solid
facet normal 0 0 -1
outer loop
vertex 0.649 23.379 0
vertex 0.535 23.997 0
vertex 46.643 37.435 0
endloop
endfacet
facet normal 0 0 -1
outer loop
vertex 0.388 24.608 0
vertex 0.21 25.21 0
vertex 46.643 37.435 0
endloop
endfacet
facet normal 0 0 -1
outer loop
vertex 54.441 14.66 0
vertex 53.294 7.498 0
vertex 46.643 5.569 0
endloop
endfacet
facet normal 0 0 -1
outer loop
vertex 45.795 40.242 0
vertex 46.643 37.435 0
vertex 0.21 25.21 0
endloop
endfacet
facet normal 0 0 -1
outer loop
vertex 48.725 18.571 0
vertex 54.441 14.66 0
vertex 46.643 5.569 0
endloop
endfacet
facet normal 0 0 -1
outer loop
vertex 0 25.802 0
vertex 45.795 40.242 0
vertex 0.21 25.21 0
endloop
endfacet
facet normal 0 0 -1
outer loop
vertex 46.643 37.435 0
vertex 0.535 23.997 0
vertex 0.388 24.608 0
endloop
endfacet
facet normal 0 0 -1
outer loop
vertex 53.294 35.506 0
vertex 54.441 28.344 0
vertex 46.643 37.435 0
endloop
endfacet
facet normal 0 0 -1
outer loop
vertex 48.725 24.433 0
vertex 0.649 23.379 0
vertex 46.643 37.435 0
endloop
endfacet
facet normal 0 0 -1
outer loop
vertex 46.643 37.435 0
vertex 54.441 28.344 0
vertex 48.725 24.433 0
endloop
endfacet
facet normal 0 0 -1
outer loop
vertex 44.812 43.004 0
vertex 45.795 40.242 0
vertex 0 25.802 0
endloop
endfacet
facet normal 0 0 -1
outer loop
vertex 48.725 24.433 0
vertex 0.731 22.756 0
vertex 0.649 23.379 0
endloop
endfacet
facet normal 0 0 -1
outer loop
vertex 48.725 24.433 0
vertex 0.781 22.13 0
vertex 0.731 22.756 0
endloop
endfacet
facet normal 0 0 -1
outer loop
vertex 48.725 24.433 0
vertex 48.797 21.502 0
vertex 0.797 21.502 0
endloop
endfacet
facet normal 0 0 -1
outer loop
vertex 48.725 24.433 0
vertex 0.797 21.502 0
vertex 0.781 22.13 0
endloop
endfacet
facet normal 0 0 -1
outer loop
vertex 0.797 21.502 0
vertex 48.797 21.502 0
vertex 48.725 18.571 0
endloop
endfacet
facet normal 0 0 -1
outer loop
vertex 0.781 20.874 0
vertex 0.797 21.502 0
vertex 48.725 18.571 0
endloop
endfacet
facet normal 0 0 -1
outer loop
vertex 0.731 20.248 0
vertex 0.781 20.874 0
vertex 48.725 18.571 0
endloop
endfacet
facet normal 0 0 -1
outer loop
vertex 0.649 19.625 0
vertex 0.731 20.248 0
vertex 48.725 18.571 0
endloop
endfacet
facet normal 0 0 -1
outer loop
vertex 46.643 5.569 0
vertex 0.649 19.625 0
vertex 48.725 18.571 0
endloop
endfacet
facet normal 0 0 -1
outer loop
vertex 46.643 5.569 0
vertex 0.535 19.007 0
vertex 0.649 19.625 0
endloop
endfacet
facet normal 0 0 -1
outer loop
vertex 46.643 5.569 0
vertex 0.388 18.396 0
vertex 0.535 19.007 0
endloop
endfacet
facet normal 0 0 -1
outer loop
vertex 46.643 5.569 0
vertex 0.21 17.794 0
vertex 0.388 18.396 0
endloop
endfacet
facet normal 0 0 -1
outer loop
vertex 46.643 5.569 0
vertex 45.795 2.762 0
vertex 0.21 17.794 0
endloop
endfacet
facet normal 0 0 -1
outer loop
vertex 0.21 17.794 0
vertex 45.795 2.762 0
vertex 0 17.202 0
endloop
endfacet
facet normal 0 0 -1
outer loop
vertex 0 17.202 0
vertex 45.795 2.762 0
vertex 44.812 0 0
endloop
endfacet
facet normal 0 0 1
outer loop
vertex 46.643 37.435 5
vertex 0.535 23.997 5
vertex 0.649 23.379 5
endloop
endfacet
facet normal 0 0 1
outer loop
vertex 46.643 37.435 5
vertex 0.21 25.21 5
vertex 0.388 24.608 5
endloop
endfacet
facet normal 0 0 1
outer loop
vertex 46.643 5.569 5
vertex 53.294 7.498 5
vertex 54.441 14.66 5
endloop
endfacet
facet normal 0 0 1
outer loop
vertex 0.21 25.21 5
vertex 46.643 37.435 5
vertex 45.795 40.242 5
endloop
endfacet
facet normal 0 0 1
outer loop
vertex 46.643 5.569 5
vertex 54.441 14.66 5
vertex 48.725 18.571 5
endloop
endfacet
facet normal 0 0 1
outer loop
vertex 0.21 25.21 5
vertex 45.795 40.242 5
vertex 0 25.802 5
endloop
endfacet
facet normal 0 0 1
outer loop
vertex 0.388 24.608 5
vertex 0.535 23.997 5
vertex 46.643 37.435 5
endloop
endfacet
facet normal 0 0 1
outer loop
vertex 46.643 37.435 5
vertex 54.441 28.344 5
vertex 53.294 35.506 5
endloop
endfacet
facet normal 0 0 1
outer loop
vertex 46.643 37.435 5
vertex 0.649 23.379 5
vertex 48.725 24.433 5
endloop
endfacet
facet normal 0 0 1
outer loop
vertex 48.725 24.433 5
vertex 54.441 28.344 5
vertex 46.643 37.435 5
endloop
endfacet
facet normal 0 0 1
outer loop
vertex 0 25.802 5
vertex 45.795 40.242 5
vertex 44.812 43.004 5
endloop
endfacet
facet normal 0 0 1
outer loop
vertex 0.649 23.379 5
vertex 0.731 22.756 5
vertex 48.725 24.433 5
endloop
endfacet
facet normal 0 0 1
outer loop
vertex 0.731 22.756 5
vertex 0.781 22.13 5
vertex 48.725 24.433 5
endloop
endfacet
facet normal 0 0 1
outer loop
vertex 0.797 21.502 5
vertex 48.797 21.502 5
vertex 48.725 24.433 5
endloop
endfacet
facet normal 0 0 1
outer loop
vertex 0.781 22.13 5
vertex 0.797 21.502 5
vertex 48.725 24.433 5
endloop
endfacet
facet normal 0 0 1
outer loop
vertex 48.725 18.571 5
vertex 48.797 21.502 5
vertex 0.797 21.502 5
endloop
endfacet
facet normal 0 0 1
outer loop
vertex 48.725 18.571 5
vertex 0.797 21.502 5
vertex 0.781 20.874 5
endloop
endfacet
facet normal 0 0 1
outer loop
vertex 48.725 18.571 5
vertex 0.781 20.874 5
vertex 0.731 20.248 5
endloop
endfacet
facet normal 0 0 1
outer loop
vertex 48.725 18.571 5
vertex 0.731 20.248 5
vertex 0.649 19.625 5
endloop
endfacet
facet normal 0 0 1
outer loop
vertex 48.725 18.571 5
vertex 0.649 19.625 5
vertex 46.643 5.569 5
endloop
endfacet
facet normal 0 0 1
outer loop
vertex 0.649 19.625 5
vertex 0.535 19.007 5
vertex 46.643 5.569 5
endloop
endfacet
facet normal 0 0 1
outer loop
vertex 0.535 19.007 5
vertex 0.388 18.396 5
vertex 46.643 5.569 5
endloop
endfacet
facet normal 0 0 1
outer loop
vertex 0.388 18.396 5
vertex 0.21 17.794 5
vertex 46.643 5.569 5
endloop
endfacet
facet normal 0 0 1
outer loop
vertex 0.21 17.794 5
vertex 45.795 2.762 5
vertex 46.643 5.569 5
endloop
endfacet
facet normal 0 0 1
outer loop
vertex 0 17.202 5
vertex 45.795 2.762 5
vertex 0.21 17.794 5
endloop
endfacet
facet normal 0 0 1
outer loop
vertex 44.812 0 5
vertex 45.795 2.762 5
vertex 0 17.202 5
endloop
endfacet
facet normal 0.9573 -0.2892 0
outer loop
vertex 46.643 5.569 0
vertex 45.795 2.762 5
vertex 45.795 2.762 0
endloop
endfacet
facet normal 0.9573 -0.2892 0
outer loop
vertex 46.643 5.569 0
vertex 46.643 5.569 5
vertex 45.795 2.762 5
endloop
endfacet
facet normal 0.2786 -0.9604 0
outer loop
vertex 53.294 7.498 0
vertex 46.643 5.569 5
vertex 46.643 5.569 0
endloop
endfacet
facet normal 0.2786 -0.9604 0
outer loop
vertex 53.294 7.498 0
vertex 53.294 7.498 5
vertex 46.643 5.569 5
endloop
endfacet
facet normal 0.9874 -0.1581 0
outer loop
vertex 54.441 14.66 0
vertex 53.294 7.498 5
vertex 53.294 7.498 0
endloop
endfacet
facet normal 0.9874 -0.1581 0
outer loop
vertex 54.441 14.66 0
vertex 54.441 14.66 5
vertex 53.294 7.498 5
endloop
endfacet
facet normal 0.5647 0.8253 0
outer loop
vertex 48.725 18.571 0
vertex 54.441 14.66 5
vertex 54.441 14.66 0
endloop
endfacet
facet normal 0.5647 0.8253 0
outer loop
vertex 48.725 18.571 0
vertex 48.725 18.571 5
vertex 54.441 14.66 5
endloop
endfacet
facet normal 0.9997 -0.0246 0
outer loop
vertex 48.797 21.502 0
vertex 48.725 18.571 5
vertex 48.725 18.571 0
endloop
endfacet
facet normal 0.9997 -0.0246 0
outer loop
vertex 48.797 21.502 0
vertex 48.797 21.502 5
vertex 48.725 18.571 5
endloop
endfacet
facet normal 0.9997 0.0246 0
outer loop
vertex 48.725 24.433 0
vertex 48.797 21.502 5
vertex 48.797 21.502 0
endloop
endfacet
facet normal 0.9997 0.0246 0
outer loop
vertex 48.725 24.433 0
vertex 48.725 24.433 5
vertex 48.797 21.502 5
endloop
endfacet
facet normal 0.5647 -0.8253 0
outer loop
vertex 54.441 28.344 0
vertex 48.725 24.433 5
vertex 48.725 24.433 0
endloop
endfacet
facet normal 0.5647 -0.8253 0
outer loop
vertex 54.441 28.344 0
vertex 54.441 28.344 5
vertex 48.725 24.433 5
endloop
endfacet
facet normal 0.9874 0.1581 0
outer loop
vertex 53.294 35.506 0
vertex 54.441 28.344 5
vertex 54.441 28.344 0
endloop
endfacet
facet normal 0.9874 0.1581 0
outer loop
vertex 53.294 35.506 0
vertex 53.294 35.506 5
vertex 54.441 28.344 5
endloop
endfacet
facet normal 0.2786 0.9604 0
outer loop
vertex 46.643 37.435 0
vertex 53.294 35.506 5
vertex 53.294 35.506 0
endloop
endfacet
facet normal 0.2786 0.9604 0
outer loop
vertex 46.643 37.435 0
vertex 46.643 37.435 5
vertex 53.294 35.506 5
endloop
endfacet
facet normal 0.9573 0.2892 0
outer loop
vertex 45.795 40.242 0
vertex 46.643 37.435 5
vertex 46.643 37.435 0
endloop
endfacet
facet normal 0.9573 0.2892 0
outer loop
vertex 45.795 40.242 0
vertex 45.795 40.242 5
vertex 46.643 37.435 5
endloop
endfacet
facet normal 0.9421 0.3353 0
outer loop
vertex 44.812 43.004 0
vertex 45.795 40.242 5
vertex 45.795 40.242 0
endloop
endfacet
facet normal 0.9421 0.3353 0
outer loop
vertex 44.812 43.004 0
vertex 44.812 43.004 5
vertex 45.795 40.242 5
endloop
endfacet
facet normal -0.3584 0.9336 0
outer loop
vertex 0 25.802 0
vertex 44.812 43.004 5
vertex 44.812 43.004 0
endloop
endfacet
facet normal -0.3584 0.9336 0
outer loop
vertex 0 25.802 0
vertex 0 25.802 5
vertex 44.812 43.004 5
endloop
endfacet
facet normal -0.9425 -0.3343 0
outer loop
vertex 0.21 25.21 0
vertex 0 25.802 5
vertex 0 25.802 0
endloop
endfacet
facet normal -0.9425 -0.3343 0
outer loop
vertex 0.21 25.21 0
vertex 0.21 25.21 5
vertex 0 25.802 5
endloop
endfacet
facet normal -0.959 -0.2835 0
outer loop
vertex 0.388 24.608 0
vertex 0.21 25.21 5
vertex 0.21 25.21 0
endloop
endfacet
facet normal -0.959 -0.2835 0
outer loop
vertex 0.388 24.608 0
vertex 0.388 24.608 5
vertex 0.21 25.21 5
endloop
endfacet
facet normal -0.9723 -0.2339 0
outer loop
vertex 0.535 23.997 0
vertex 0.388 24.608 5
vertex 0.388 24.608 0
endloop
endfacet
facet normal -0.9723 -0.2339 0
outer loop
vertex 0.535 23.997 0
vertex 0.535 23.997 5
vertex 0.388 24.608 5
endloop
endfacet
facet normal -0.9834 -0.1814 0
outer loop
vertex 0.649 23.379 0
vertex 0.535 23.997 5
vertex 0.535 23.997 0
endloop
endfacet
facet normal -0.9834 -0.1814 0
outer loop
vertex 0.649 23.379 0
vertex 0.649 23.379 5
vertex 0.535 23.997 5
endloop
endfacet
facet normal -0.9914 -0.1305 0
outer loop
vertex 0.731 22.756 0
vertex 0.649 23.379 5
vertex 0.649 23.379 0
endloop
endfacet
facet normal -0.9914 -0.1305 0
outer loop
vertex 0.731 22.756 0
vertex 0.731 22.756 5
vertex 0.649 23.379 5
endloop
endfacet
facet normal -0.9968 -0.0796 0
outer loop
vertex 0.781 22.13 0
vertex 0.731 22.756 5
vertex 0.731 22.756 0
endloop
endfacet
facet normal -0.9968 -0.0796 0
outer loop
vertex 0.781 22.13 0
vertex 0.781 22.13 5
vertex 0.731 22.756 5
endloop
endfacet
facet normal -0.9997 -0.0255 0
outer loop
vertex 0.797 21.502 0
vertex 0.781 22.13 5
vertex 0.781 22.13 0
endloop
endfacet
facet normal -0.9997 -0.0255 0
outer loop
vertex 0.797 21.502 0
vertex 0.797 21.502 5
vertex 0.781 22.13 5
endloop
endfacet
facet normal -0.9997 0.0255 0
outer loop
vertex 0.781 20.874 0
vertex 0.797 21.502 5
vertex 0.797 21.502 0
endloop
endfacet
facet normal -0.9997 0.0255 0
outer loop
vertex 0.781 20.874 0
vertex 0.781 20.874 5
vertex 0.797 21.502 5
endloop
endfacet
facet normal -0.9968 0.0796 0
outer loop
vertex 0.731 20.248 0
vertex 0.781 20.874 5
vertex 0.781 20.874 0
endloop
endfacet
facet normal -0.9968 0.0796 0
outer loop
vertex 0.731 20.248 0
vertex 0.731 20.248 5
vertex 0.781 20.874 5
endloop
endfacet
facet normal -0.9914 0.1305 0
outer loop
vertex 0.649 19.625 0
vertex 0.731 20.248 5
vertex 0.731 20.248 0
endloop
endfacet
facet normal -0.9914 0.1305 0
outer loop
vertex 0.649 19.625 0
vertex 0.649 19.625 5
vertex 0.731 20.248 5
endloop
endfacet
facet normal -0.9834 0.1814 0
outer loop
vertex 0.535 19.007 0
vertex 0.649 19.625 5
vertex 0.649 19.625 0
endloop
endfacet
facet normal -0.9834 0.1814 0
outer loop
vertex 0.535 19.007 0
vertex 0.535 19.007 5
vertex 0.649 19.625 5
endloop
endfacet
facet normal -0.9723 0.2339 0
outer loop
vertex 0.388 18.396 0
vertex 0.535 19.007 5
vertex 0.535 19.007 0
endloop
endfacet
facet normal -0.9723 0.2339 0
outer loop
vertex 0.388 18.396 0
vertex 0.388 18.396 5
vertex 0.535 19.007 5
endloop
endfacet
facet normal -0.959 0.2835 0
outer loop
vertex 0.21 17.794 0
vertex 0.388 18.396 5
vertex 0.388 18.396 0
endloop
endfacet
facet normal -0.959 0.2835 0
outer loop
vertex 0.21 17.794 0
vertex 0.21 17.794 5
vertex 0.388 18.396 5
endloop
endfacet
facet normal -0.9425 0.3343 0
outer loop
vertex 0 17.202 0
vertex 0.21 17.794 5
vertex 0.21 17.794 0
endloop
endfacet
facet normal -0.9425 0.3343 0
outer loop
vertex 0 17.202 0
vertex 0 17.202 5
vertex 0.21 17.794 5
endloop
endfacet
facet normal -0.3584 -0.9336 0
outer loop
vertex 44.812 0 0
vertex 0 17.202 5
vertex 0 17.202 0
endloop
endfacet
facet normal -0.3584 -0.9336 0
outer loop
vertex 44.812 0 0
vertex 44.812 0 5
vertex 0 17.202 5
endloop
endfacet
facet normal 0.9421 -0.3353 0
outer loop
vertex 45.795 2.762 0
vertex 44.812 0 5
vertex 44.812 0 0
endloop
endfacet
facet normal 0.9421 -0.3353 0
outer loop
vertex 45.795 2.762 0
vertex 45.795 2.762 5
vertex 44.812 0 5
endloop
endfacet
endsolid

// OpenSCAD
$fn = 32;

// ----------------------------------------------------------------------
// Gear sector: 2 teeth on 42 degrees
// ----------------------------------------------------------------------

// --- parameters (mm) ---
sector_angle = 42;        // sector angle, degrees
root_r = 60;              // root circle radius
tooth_h = 6;              // tooth height over the root circle
teeth = 2;                // number of teeth on the sector
hub_r = 12;               // hub bore radius
plate_t = 5;              // sector thickness, Z
arc_step = 3;             // sampling step of the root/hub arcs, degrees

tip_r = root_r + tooth_h;  // tip circle radius

profile = [[44.812, 0], [45.795, 2.762], [46.643, 5.569], [53.294, 7.498], [54.441, 14.66], [48.725, 18.571], [48.797, 21.502], [48.725, 24.433], [54.441, 28.344], [53.294, 35.506], [46.643, 37.435], [45.795, 40.242], [44.812, 43.004], [0, 25.802], [0.21, 25.21], [0.388, 24.608], [0.535, 23.997], [0.649, 23.379], [0.731, 22.756], [0.781, 22.13], [0.797, 21.502], [0.781, 20.874], [0.731, 20.248], [0.649, 19.625], [0.535, 19.007], [0.388, 18.396], [0.21, 17.794], [0, 17.202]];  // primary outline, 28 points, counter clockwise

// --- the one profile operation ---
linear_extrude(height = plate_t) polygon(points = profile);
